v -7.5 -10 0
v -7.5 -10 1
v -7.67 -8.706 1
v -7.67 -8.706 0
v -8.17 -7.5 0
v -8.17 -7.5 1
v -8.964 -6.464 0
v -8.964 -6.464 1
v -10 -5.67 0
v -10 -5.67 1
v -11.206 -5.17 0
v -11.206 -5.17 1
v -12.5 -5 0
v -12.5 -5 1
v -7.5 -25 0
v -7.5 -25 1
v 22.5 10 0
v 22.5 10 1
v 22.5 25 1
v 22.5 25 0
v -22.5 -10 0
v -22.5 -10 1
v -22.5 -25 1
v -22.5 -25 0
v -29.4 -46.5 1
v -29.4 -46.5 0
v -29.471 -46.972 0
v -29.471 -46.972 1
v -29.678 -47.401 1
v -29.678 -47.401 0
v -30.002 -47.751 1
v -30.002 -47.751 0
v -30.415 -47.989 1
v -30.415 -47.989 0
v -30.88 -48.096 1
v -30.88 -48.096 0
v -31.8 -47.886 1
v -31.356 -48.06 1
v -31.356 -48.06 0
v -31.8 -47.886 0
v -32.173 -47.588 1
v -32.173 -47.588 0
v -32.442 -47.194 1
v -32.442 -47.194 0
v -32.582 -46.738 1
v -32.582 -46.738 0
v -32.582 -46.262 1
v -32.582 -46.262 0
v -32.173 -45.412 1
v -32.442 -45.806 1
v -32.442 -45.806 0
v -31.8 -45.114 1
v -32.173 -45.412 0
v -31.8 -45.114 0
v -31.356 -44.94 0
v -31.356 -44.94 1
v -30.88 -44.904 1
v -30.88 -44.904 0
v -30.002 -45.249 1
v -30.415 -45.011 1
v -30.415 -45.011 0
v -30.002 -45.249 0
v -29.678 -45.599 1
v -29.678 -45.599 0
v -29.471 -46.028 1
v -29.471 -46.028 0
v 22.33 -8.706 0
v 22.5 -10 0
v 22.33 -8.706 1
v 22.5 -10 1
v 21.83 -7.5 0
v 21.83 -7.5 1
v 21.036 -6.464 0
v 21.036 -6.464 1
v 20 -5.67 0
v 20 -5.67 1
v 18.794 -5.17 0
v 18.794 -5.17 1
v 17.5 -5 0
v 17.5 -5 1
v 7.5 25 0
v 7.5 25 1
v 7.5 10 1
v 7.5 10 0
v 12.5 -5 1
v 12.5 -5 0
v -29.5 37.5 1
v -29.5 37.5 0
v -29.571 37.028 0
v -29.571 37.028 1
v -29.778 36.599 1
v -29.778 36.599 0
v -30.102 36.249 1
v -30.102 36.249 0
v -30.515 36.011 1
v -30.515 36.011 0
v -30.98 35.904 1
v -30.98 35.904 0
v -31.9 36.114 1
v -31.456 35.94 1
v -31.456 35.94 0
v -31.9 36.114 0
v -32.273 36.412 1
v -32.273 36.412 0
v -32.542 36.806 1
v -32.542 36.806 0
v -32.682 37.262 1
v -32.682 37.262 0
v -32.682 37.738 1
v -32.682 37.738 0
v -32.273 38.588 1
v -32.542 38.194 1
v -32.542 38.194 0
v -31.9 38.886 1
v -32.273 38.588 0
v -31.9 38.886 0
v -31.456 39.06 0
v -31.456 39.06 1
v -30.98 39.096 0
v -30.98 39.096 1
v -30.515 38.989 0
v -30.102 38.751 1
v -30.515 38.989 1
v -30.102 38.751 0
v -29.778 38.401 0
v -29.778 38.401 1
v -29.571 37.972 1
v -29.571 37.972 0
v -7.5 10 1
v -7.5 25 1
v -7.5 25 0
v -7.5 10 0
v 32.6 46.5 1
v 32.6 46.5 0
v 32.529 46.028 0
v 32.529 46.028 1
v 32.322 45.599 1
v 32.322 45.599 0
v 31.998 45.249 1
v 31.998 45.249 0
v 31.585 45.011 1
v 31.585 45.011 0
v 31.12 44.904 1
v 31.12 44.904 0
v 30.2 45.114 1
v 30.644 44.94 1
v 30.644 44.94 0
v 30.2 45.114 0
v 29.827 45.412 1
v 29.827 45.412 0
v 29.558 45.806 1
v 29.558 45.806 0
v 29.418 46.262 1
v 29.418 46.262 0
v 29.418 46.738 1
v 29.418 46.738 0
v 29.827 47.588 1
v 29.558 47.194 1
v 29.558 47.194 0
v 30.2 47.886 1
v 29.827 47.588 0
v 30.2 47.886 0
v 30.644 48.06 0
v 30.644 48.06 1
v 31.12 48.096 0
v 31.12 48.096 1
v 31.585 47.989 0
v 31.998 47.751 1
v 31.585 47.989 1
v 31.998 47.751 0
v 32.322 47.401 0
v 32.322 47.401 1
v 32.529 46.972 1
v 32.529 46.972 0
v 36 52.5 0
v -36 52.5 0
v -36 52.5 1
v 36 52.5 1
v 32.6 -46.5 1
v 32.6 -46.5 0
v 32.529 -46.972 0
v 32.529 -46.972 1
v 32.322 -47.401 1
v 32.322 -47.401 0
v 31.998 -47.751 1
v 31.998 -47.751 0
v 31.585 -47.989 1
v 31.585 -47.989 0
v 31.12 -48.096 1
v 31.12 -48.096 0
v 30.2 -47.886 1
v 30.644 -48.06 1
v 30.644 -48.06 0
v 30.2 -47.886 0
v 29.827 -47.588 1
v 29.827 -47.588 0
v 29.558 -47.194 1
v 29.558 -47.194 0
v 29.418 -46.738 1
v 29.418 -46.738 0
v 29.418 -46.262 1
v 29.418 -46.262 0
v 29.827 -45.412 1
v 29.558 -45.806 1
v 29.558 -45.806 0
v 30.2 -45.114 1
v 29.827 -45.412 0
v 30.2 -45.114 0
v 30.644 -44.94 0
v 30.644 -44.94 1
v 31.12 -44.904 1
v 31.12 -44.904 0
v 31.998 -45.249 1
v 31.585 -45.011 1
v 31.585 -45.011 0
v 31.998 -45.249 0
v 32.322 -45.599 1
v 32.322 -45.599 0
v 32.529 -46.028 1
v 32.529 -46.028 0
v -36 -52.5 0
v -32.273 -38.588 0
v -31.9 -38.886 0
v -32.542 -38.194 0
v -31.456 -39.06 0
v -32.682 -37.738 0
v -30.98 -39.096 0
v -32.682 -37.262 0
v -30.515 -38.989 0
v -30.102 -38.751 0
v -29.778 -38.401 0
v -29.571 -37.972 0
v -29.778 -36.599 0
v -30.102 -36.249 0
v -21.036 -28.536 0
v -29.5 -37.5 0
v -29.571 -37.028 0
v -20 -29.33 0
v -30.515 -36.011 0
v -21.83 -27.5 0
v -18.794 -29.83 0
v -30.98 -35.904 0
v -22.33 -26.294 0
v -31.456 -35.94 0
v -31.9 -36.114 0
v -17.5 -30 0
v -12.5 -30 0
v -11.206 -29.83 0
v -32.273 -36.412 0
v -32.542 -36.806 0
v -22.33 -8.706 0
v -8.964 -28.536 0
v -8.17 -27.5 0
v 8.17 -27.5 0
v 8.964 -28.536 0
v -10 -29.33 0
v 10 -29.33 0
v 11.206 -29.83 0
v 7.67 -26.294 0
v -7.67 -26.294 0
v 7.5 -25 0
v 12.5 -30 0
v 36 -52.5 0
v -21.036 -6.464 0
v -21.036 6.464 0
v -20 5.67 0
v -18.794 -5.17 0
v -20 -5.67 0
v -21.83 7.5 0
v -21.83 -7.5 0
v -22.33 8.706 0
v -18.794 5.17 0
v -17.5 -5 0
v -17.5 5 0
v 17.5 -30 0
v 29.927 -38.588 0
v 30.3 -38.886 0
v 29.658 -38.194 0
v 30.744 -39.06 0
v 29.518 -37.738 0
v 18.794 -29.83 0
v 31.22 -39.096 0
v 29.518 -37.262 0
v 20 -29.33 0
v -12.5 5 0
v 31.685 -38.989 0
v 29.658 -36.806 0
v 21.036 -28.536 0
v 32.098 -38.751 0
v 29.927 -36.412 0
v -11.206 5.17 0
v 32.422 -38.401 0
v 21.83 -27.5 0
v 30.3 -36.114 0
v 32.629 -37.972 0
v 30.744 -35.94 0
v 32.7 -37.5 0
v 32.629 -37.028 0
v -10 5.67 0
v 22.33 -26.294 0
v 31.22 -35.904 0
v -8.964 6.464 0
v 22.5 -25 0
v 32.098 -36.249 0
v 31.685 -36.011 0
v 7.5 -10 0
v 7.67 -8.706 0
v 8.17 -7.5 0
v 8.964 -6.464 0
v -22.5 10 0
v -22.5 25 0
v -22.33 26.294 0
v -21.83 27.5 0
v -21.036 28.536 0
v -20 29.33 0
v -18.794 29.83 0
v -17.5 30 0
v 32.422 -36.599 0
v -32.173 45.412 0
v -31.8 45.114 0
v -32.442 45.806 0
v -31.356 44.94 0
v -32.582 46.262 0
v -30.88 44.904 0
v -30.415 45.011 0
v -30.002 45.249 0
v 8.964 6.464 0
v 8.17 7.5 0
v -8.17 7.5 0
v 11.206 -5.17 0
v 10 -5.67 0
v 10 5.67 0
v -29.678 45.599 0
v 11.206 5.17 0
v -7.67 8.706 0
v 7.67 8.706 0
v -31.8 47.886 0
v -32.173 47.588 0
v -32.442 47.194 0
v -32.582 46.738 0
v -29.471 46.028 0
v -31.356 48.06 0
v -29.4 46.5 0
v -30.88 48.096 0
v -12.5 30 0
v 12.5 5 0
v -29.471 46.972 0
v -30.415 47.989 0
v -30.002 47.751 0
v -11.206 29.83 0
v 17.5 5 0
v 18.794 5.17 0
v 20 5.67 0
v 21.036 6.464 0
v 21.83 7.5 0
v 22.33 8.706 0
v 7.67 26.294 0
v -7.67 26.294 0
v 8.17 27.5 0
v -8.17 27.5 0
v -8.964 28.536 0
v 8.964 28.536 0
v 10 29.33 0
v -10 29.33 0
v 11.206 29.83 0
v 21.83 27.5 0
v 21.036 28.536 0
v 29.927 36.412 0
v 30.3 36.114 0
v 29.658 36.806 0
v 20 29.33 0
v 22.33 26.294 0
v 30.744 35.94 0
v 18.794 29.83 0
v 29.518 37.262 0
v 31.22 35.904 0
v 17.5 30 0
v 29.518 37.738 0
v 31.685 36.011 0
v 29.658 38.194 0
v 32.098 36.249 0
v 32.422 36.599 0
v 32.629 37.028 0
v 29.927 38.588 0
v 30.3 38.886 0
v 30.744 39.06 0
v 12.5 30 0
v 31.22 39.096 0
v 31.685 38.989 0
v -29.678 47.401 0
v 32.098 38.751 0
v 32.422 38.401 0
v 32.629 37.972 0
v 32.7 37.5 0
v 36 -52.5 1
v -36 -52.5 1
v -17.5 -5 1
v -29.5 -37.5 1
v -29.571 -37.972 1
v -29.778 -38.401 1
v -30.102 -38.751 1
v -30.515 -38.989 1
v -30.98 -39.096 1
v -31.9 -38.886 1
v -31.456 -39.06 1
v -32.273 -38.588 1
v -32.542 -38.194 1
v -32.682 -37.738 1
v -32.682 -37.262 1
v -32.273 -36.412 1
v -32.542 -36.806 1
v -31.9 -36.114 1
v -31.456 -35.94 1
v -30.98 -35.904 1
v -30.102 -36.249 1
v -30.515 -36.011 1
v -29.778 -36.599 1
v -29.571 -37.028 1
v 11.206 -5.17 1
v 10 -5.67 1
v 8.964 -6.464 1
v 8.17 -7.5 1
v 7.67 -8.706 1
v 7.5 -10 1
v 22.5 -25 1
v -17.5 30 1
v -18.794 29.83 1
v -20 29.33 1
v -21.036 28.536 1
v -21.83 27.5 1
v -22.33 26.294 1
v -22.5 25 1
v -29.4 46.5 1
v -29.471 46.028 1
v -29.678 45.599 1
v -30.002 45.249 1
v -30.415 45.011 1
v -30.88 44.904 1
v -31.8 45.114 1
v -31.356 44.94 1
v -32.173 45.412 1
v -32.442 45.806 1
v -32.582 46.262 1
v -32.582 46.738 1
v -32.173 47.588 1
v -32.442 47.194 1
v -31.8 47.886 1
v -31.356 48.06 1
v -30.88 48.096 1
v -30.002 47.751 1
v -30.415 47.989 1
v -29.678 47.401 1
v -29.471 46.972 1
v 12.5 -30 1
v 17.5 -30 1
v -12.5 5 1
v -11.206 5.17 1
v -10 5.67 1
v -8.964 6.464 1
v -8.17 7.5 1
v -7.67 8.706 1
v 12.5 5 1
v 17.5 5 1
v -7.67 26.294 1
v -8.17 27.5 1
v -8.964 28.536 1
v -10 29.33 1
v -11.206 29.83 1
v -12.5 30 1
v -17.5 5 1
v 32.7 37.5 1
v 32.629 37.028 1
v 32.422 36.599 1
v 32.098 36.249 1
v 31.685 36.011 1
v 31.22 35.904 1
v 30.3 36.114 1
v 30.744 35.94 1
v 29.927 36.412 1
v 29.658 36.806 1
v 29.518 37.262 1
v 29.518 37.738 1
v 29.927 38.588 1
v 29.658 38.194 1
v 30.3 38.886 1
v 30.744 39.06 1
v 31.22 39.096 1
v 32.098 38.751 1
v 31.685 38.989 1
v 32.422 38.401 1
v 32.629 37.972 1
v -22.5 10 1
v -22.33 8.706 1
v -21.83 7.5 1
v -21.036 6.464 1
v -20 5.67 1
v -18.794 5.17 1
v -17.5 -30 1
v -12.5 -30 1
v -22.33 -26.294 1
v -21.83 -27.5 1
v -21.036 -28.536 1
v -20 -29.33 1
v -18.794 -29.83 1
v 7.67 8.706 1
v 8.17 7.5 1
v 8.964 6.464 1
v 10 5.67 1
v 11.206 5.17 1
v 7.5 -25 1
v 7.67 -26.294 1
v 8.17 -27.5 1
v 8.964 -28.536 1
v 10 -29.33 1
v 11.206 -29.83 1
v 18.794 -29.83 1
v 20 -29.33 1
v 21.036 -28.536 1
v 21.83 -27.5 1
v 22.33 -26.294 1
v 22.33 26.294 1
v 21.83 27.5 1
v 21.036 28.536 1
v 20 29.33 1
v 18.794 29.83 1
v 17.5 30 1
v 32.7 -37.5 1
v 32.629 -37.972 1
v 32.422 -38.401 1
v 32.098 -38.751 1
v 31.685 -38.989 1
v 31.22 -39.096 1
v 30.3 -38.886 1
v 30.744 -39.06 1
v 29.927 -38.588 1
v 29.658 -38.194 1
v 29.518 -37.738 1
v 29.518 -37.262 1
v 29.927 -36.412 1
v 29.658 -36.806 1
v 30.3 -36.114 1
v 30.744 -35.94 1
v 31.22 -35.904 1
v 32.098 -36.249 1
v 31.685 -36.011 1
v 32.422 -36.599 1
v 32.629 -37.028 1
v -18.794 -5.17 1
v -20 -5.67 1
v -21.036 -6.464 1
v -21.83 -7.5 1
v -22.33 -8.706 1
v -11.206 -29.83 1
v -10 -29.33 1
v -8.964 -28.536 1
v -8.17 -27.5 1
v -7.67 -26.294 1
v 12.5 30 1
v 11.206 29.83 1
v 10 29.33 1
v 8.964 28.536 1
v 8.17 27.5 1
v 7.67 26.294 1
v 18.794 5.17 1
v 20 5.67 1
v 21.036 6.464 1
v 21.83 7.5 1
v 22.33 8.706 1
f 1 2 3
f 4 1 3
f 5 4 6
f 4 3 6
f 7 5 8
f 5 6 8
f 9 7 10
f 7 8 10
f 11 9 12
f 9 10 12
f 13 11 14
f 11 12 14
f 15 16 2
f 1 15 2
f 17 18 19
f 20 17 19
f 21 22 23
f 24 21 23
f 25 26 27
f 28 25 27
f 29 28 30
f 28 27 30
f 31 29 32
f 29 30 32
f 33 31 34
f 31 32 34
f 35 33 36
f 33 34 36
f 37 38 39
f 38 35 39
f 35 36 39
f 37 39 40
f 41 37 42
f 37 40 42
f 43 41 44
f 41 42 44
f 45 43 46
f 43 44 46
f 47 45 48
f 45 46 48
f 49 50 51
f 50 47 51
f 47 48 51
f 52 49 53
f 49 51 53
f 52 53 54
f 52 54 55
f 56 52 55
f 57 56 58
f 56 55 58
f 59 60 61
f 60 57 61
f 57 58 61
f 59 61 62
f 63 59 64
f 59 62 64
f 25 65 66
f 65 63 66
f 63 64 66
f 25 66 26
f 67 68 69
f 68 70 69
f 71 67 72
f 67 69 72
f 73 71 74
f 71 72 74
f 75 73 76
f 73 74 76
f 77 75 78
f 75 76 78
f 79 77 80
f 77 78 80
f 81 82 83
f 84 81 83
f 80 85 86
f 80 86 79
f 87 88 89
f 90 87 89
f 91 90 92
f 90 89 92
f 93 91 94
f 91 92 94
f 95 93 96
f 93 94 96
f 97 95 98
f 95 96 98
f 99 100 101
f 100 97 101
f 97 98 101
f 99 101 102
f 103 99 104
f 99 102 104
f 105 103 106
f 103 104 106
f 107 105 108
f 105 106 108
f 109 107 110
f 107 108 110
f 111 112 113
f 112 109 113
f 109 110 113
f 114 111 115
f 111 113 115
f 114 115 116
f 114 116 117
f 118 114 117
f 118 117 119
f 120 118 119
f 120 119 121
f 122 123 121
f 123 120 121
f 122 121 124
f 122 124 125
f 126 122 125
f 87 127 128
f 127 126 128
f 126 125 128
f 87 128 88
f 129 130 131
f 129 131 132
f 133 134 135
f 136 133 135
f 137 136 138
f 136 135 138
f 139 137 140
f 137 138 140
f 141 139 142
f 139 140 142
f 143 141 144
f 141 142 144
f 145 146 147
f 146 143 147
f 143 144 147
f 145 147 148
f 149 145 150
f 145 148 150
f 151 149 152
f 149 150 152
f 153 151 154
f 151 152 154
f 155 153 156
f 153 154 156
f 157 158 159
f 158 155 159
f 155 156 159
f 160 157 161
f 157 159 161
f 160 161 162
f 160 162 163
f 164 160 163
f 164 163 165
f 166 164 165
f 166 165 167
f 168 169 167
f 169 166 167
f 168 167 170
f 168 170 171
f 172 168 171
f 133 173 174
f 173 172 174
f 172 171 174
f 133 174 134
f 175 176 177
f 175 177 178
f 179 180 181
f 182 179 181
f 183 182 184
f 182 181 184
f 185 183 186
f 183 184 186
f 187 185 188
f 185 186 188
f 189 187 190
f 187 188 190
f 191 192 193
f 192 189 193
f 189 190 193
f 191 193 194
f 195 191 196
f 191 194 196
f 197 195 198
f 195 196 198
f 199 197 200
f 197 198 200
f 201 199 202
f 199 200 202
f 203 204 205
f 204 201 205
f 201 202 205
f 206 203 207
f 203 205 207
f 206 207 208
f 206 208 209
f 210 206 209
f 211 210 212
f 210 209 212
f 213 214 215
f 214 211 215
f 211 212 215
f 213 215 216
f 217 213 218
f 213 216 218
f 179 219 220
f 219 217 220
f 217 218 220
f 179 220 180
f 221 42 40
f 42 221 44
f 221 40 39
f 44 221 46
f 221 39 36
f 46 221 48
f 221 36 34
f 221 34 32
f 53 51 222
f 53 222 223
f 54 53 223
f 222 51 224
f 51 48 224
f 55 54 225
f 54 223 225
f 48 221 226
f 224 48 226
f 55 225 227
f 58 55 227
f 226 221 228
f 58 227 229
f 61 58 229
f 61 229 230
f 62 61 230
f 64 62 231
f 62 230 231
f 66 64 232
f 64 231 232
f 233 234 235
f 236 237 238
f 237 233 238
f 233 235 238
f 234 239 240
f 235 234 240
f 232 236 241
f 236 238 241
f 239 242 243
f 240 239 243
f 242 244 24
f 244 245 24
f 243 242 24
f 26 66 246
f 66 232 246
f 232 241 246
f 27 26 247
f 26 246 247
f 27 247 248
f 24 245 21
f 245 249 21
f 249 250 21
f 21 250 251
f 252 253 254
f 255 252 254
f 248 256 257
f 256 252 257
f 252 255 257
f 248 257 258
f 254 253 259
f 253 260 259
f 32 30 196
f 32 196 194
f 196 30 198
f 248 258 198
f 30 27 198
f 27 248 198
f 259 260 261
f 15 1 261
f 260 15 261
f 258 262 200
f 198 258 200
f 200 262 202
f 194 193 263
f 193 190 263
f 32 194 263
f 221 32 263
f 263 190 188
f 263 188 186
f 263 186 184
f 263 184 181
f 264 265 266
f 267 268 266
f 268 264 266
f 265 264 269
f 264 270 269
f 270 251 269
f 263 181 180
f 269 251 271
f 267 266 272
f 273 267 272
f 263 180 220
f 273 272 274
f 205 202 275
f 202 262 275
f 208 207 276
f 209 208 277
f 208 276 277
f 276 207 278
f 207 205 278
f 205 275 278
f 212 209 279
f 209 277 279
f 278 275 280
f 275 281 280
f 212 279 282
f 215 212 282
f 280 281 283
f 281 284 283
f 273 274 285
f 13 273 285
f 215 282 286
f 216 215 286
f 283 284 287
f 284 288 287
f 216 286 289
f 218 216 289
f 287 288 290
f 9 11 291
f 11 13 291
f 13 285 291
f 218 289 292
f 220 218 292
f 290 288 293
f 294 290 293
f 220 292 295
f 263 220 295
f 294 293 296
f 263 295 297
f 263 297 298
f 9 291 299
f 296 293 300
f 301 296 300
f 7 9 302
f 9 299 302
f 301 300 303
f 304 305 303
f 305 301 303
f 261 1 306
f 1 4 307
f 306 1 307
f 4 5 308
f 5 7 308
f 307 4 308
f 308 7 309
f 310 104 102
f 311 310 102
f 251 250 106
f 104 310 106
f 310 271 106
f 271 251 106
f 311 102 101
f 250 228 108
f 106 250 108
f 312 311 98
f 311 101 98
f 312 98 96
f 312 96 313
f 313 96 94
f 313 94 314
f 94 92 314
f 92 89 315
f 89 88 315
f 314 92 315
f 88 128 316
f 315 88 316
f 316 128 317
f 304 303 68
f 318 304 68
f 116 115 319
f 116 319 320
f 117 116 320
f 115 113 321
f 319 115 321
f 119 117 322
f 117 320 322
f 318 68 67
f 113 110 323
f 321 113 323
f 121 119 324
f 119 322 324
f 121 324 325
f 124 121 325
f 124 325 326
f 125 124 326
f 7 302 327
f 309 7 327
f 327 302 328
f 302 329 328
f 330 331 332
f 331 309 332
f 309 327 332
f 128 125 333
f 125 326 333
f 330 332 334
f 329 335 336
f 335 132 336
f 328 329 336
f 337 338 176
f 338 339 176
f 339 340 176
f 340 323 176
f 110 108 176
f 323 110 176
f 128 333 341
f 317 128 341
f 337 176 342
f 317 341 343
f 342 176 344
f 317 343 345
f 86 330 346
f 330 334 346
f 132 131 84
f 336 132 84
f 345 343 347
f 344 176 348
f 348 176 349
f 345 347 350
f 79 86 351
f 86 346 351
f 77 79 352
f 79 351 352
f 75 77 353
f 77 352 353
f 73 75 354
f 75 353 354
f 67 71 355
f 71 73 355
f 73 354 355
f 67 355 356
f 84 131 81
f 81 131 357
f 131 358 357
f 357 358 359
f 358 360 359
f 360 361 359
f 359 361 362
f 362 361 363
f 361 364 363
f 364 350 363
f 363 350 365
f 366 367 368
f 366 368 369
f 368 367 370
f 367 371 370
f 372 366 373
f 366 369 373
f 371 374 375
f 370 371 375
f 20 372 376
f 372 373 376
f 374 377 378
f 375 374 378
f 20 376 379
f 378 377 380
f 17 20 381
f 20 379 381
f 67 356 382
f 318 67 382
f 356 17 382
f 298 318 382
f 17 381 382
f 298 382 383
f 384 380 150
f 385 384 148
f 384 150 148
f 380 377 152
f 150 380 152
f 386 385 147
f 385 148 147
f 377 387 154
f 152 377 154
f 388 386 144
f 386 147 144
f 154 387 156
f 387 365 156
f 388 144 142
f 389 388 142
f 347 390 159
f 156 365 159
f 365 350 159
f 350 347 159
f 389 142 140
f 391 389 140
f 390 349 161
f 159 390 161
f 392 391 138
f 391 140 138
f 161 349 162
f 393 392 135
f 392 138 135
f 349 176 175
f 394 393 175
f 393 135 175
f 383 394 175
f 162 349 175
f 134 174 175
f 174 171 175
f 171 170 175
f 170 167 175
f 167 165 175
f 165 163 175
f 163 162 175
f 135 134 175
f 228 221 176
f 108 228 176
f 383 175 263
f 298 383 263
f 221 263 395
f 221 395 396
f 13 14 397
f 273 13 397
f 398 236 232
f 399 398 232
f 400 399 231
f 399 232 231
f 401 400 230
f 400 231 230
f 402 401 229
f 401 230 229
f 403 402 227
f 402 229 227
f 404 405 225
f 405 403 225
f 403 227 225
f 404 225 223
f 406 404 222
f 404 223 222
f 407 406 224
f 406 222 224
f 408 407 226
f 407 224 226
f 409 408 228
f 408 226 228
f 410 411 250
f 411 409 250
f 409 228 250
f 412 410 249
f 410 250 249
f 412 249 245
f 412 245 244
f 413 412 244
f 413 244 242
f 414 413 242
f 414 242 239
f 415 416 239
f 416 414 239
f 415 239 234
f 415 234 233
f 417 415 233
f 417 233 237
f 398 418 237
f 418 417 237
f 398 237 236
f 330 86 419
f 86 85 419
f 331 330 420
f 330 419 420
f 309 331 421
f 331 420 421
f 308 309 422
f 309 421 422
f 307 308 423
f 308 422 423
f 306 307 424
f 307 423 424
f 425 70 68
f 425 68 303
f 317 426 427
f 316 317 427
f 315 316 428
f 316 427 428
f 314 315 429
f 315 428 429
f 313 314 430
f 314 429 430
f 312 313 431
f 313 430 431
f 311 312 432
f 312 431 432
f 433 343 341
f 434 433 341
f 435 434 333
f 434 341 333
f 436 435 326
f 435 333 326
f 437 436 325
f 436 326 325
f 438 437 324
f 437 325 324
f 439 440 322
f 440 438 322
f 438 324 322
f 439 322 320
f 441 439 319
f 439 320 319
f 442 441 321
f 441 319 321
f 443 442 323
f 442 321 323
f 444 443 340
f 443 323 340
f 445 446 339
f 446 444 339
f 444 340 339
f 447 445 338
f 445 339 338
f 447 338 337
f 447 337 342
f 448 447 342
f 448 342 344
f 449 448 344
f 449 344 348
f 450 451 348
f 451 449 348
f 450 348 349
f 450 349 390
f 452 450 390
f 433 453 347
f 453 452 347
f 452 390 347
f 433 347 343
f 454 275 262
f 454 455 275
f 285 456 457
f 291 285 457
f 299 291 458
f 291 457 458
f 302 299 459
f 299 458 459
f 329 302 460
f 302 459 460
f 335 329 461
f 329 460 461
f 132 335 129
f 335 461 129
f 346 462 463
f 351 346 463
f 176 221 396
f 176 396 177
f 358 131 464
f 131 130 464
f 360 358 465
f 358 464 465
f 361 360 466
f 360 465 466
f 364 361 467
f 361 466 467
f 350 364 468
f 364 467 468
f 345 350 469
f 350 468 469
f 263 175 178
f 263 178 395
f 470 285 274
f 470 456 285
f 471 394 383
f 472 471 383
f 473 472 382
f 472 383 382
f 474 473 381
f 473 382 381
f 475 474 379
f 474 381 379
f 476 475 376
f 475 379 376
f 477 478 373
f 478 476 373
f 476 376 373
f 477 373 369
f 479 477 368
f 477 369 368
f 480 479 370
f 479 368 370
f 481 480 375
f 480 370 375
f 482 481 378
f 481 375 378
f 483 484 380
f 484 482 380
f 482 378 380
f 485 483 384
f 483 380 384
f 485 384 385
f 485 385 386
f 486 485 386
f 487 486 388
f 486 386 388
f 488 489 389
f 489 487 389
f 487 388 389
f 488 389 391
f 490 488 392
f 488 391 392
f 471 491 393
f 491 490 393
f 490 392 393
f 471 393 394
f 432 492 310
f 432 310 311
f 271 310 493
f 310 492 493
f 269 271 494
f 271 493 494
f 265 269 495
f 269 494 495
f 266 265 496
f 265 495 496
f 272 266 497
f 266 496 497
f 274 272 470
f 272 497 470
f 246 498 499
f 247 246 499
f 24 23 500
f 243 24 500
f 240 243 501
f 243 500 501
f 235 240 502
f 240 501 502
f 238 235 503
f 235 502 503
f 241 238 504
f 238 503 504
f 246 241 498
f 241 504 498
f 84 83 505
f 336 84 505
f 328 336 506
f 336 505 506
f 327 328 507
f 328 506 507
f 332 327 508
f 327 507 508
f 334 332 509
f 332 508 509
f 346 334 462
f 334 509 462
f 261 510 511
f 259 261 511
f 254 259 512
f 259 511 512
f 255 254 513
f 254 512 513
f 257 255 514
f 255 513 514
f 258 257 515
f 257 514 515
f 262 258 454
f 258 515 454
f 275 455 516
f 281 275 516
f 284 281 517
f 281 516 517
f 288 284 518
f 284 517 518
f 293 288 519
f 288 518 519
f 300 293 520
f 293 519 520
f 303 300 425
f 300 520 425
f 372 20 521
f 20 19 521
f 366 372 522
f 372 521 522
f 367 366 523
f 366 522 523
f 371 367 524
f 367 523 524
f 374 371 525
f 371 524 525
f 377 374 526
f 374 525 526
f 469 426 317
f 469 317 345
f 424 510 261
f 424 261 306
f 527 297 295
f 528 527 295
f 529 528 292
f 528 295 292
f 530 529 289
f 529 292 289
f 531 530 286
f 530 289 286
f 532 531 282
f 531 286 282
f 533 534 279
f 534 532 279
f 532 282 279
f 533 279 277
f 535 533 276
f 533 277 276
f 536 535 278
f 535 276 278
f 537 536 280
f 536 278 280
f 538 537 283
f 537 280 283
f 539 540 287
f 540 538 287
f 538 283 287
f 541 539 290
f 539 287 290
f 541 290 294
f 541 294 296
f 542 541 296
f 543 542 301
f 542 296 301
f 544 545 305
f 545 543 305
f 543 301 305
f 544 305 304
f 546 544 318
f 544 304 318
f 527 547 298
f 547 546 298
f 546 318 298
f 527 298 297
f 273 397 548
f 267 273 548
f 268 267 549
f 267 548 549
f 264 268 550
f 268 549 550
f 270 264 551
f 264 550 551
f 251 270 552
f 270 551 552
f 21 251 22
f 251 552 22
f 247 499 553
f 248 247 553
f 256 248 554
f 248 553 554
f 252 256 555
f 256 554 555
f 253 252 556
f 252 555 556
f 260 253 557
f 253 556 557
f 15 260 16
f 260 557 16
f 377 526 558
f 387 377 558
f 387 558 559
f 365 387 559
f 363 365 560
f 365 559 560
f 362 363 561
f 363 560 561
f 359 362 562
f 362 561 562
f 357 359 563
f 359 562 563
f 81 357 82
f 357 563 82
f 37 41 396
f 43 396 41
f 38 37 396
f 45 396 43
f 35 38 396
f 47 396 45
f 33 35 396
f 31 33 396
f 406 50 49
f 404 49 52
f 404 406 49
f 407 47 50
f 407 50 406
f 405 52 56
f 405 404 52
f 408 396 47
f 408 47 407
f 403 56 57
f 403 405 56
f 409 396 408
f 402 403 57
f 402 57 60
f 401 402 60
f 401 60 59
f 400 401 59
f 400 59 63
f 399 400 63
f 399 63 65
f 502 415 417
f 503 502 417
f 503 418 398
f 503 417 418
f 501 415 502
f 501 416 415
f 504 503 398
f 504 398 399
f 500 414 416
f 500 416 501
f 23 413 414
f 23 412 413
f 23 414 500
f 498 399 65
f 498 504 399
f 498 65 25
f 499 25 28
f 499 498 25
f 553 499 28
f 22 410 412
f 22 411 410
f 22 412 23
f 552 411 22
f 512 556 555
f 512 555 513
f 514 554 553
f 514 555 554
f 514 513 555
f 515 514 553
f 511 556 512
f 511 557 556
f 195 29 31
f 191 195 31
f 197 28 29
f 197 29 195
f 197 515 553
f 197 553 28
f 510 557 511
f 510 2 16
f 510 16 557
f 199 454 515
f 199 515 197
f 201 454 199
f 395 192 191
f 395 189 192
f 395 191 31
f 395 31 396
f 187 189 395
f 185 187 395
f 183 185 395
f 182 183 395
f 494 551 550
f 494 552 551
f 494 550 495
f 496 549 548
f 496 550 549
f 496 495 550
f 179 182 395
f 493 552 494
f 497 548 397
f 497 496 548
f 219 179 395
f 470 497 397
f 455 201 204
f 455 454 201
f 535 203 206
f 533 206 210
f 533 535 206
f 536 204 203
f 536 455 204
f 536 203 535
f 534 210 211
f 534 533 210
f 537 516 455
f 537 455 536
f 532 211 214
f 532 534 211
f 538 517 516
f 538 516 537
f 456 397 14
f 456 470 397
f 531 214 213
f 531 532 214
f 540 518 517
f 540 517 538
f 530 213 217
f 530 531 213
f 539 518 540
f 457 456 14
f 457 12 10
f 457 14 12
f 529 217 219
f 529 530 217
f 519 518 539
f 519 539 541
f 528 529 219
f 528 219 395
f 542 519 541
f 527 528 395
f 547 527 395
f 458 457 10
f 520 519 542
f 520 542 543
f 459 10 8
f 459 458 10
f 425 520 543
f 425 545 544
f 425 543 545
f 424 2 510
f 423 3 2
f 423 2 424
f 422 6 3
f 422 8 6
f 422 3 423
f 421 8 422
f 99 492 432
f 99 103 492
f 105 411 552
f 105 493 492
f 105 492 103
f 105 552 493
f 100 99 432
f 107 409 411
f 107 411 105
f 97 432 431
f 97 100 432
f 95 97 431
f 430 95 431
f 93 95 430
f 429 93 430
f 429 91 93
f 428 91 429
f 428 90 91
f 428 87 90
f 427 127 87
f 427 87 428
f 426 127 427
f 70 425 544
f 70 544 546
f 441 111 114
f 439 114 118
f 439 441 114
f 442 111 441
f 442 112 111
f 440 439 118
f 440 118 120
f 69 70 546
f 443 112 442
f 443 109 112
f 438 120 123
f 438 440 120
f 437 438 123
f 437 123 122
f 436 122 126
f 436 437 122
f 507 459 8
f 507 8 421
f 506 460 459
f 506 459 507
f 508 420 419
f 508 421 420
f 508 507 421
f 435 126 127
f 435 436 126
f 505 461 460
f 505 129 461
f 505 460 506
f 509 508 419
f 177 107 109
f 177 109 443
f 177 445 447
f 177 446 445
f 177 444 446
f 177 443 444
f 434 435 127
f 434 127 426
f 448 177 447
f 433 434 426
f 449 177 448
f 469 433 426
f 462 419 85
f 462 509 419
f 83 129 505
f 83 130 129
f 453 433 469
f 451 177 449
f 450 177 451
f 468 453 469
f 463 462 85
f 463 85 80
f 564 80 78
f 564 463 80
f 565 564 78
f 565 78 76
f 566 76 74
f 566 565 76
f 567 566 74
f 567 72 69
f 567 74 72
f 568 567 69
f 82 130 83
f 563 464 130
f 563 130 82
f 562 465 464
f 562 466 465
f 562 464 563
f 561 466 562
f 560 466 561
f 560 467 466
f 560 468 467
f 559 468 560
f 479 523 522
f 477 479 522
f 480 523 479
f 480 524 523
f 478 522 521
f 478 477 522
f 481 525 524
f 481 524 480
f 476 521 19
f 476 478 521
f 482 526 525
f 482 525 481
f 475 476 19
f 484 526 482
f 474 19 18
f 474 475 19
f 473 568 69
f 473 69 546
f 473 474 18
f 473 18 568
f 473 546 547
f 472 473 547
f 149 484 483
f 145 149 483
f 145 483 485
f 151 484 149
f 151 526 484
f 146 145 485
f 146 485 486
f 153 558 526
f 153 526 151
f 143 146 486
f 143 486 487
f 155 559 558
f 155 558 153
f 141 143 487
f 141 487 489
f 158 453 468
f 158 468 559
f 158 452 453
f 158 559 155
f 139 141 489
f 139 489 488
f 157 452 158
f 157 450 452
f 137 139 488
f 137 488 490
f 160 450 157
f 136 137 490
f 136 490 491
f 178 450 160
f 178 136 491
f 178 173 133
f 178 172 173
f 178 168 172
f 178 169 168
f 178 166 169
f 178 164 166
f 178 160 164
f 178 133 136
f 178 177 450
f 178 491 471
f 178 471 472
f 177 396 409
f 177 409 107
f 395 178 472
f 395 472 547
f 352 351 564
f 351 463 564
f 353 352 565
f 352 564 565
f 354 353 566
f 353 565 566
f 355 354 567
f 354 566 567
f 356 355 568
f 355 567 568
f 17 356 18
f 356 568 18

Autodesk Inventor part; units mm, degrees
ref_plane "YZ Plane" through (0, 0, 0) normal (1, 0, 0) x (0, 1, 0)
ref_plane "XZ Plane" through (0, 0, 0) normal (0, 1, 0) x (-1, 0, 0)
ref_plane "XY Plane" through (0, 0, 0) normal (0, 0, 1) x (1, 0, 0)
sketch "Sketch1" plane through (0, 0, 0) normal (0, 0, 1) x (1, 0, 0)
  line L0 (-36, 52.5) -> (36, 52.5)
  line L1 (36, 52.5) -> (36, -52.5)
  line L2 (36, -52.5) -> (-36, -52.5)
  line L3 (-36, -52.5) -> (-36, 52.5)
  line L4 (-36, 52.5) -> (36, -52.5) construction
  line L5 (36, 52.5) -> (-36, -52.5) construction
  circle A0 centre (31.1, -37.5) radius 1.6
  line L6 (0, 0) -> (12.8976, 0)
  line L7 (0, 0) -> (0, 11.3109)
  circle A1 centre (-31.1, -37.5) radius 1.6
  circle A2 centre (31.1, 37.5) radius 1.6
  circle A3 centre (-31.1, 37.5) radius 1.6
  circle A4 centre (-31, -46.5) radius 1.6
  circle A5 centre (-31, 46.5) radius 1.6
  circle A6 centre (31, -46.5) radius 1.6
  circle A7 centre (31, 46.5) radius 1.6
  dimension "d0" = 72
  dimension "d1" = 105
  dimension "d2" = 3.2
  dimension "d3" = 4.9
  dimension "d4" = 15
  dimension "d6" = 3.2
  dimension "d7" = 6
  dimension "d8" = 5
extrude "Plate1" add sketch "Sketch1" along normal blind 1
sketch "Sketch2" plane through (0, 0, 1) normal (0, 0, 1) x (1, 0, 0)
  line L0 (-17.5, 30) -> (-12.5, 30)
  line L1 (-7.5, 25) -> (-7.5, 10)
  line L2 (-12.5, 5) -> (-17.5, 5)
  line L3 (-22.5, 10) -> (-22.5, 25)
  line L4 (-22.5, 30) -> (-7.5, 5) construction
  line L5 (-7.5, 30) -> (-22.5, 5) construction
  line L6 (-28.3073, 0) -> (28.3073, 0)
  line L7 (0, 37.5) -> (0, -37.5)
  arc A0 (-17.5, 30) -> (-22.5, 25) centre (-17.5, 25) ccw
  arc A1 (-7.5, 25) -> (-12.5, 30) centre (-12.5, 25) ccw
  arc A2 (-12.5, 5) -> (-7.5, 10) centre (-12.5, 10) ccw
  arc A3 (-22.5, 10) -> (-17.5, 5) centre (-17.5, 10) ccw
  line L8 (17.5, 30) -> (12.5, 30)
  line L9 (7.5, 25) -> (7.5, 10)
  line L10 (12.5, 5) -> (17.5, 5)
  line L11 (22.5, 10) -> (22.5, 25)
  line L12 (22.5, 30) -> (7.5, 5) construction
  line L13 (7.5, 30) -> (22.5, 5) construction
  arc A4 (22.5, 25) -> (17.5, 30) centre (17.5, 25) ccw
  arc A5 (12.5, 30) -> (7.5, 25) centre (12.5, 25) ccw
  arc A6 (7.5, 10) -> (12.5, 5) centre (12.5, 10) ccw
  arc A7 (17.5, 5) -> (22.5, 10) centre (17.5, 10) ccw
  line L14 (-17.5, -30) -> (-12.5, -30)
  line L15 (-7.5, -25) -> (-7.5, -10)
  line L16 (-12.5, -5) -> (-17.5, -5)
  line L17 (-22.5, -10) -> (-22.5, -25)
  line L18 (-22.5, -30) -> (-7.5, -5) construction
  line L19 (-7.5, -30) -> (-22.5, -5) construction
  arc A8 (-22.5, -25) -> (-17.5, -30) centre (-17.5, -25) ccw
  arc A9 (-12.5, -30) -> (-7.5, -25) centre (-12.5, -25) ccw
  arc A10 (-7.5, -10) -> (-12.5, -5) centre (-12.5, -10) ccw
  arc A11 (-17.5, -5) -> (-22.5, -10) centre (-17.5, -10) ccw
  arc A12 (7.5, -25) -> (12.5, -30) centre (12.5, -25) ccw
  line L20 (7.5, -25) -> (7.5, -10)
  line L21 (17.5, -30) -> (12.5, -30)
  arc A13 (17.5, -30) -> (22.5, -25) centre (17.5, -25) ccw
  arc A14 (12.5, -5) -> (7.5, -10) centre (12.5, -10) ccw
  line L22 (22.5, -10) -> (22.5, -25)
  arc A15 (22.5, -10) -> (17.5, -5) centre (17.5, -10) ccw
  line L23 (7.5, -30) -> (22.5, -5) construction
  line L24 (22.5, -30) -> (7.5, -5) construction
  line L25 (12.5, -5) -> (17.5, -5)
  point P0 (0, 0)
  point P1 (-15, 17.5)
  point P2 (0, 0)
  point P3 (15, 17.5)
  point P4 (-15, -17.5)
  point P5 (15, -17.5)
  dimension "d9" = 15
  dimension "d10" = 25
  dimension "d12" = 10
  dimension "d13" = 15
  dimension "d14" = 5
extrude "Cut1" cut sketch "Sketch2" against normal blind 1
equation "\"d15\" = 厚度"
equation "\"d5\" = 厚度"
equation "\"折彎半徑\" = 厚度"
equation "\"折彎離隙寬度\" = 厚度"
equation "\"折彎離隙深度\" = 0.5 * 厚度"
equation "\"轉角離隙大小\" = 4 * 厚度"
equation "\"最小剩餘\" = 2 * 厚度"
equation "\"轉移半徑\" = 折彎半徑"
equation "\"Jacobi半徑大小\" = 折彎半徑"
equation "\"間隙大小\" = 厚度"
equation "\"厚度\" = 1"
properties part number "battery_box_24V_side1" material "Aluminum"
